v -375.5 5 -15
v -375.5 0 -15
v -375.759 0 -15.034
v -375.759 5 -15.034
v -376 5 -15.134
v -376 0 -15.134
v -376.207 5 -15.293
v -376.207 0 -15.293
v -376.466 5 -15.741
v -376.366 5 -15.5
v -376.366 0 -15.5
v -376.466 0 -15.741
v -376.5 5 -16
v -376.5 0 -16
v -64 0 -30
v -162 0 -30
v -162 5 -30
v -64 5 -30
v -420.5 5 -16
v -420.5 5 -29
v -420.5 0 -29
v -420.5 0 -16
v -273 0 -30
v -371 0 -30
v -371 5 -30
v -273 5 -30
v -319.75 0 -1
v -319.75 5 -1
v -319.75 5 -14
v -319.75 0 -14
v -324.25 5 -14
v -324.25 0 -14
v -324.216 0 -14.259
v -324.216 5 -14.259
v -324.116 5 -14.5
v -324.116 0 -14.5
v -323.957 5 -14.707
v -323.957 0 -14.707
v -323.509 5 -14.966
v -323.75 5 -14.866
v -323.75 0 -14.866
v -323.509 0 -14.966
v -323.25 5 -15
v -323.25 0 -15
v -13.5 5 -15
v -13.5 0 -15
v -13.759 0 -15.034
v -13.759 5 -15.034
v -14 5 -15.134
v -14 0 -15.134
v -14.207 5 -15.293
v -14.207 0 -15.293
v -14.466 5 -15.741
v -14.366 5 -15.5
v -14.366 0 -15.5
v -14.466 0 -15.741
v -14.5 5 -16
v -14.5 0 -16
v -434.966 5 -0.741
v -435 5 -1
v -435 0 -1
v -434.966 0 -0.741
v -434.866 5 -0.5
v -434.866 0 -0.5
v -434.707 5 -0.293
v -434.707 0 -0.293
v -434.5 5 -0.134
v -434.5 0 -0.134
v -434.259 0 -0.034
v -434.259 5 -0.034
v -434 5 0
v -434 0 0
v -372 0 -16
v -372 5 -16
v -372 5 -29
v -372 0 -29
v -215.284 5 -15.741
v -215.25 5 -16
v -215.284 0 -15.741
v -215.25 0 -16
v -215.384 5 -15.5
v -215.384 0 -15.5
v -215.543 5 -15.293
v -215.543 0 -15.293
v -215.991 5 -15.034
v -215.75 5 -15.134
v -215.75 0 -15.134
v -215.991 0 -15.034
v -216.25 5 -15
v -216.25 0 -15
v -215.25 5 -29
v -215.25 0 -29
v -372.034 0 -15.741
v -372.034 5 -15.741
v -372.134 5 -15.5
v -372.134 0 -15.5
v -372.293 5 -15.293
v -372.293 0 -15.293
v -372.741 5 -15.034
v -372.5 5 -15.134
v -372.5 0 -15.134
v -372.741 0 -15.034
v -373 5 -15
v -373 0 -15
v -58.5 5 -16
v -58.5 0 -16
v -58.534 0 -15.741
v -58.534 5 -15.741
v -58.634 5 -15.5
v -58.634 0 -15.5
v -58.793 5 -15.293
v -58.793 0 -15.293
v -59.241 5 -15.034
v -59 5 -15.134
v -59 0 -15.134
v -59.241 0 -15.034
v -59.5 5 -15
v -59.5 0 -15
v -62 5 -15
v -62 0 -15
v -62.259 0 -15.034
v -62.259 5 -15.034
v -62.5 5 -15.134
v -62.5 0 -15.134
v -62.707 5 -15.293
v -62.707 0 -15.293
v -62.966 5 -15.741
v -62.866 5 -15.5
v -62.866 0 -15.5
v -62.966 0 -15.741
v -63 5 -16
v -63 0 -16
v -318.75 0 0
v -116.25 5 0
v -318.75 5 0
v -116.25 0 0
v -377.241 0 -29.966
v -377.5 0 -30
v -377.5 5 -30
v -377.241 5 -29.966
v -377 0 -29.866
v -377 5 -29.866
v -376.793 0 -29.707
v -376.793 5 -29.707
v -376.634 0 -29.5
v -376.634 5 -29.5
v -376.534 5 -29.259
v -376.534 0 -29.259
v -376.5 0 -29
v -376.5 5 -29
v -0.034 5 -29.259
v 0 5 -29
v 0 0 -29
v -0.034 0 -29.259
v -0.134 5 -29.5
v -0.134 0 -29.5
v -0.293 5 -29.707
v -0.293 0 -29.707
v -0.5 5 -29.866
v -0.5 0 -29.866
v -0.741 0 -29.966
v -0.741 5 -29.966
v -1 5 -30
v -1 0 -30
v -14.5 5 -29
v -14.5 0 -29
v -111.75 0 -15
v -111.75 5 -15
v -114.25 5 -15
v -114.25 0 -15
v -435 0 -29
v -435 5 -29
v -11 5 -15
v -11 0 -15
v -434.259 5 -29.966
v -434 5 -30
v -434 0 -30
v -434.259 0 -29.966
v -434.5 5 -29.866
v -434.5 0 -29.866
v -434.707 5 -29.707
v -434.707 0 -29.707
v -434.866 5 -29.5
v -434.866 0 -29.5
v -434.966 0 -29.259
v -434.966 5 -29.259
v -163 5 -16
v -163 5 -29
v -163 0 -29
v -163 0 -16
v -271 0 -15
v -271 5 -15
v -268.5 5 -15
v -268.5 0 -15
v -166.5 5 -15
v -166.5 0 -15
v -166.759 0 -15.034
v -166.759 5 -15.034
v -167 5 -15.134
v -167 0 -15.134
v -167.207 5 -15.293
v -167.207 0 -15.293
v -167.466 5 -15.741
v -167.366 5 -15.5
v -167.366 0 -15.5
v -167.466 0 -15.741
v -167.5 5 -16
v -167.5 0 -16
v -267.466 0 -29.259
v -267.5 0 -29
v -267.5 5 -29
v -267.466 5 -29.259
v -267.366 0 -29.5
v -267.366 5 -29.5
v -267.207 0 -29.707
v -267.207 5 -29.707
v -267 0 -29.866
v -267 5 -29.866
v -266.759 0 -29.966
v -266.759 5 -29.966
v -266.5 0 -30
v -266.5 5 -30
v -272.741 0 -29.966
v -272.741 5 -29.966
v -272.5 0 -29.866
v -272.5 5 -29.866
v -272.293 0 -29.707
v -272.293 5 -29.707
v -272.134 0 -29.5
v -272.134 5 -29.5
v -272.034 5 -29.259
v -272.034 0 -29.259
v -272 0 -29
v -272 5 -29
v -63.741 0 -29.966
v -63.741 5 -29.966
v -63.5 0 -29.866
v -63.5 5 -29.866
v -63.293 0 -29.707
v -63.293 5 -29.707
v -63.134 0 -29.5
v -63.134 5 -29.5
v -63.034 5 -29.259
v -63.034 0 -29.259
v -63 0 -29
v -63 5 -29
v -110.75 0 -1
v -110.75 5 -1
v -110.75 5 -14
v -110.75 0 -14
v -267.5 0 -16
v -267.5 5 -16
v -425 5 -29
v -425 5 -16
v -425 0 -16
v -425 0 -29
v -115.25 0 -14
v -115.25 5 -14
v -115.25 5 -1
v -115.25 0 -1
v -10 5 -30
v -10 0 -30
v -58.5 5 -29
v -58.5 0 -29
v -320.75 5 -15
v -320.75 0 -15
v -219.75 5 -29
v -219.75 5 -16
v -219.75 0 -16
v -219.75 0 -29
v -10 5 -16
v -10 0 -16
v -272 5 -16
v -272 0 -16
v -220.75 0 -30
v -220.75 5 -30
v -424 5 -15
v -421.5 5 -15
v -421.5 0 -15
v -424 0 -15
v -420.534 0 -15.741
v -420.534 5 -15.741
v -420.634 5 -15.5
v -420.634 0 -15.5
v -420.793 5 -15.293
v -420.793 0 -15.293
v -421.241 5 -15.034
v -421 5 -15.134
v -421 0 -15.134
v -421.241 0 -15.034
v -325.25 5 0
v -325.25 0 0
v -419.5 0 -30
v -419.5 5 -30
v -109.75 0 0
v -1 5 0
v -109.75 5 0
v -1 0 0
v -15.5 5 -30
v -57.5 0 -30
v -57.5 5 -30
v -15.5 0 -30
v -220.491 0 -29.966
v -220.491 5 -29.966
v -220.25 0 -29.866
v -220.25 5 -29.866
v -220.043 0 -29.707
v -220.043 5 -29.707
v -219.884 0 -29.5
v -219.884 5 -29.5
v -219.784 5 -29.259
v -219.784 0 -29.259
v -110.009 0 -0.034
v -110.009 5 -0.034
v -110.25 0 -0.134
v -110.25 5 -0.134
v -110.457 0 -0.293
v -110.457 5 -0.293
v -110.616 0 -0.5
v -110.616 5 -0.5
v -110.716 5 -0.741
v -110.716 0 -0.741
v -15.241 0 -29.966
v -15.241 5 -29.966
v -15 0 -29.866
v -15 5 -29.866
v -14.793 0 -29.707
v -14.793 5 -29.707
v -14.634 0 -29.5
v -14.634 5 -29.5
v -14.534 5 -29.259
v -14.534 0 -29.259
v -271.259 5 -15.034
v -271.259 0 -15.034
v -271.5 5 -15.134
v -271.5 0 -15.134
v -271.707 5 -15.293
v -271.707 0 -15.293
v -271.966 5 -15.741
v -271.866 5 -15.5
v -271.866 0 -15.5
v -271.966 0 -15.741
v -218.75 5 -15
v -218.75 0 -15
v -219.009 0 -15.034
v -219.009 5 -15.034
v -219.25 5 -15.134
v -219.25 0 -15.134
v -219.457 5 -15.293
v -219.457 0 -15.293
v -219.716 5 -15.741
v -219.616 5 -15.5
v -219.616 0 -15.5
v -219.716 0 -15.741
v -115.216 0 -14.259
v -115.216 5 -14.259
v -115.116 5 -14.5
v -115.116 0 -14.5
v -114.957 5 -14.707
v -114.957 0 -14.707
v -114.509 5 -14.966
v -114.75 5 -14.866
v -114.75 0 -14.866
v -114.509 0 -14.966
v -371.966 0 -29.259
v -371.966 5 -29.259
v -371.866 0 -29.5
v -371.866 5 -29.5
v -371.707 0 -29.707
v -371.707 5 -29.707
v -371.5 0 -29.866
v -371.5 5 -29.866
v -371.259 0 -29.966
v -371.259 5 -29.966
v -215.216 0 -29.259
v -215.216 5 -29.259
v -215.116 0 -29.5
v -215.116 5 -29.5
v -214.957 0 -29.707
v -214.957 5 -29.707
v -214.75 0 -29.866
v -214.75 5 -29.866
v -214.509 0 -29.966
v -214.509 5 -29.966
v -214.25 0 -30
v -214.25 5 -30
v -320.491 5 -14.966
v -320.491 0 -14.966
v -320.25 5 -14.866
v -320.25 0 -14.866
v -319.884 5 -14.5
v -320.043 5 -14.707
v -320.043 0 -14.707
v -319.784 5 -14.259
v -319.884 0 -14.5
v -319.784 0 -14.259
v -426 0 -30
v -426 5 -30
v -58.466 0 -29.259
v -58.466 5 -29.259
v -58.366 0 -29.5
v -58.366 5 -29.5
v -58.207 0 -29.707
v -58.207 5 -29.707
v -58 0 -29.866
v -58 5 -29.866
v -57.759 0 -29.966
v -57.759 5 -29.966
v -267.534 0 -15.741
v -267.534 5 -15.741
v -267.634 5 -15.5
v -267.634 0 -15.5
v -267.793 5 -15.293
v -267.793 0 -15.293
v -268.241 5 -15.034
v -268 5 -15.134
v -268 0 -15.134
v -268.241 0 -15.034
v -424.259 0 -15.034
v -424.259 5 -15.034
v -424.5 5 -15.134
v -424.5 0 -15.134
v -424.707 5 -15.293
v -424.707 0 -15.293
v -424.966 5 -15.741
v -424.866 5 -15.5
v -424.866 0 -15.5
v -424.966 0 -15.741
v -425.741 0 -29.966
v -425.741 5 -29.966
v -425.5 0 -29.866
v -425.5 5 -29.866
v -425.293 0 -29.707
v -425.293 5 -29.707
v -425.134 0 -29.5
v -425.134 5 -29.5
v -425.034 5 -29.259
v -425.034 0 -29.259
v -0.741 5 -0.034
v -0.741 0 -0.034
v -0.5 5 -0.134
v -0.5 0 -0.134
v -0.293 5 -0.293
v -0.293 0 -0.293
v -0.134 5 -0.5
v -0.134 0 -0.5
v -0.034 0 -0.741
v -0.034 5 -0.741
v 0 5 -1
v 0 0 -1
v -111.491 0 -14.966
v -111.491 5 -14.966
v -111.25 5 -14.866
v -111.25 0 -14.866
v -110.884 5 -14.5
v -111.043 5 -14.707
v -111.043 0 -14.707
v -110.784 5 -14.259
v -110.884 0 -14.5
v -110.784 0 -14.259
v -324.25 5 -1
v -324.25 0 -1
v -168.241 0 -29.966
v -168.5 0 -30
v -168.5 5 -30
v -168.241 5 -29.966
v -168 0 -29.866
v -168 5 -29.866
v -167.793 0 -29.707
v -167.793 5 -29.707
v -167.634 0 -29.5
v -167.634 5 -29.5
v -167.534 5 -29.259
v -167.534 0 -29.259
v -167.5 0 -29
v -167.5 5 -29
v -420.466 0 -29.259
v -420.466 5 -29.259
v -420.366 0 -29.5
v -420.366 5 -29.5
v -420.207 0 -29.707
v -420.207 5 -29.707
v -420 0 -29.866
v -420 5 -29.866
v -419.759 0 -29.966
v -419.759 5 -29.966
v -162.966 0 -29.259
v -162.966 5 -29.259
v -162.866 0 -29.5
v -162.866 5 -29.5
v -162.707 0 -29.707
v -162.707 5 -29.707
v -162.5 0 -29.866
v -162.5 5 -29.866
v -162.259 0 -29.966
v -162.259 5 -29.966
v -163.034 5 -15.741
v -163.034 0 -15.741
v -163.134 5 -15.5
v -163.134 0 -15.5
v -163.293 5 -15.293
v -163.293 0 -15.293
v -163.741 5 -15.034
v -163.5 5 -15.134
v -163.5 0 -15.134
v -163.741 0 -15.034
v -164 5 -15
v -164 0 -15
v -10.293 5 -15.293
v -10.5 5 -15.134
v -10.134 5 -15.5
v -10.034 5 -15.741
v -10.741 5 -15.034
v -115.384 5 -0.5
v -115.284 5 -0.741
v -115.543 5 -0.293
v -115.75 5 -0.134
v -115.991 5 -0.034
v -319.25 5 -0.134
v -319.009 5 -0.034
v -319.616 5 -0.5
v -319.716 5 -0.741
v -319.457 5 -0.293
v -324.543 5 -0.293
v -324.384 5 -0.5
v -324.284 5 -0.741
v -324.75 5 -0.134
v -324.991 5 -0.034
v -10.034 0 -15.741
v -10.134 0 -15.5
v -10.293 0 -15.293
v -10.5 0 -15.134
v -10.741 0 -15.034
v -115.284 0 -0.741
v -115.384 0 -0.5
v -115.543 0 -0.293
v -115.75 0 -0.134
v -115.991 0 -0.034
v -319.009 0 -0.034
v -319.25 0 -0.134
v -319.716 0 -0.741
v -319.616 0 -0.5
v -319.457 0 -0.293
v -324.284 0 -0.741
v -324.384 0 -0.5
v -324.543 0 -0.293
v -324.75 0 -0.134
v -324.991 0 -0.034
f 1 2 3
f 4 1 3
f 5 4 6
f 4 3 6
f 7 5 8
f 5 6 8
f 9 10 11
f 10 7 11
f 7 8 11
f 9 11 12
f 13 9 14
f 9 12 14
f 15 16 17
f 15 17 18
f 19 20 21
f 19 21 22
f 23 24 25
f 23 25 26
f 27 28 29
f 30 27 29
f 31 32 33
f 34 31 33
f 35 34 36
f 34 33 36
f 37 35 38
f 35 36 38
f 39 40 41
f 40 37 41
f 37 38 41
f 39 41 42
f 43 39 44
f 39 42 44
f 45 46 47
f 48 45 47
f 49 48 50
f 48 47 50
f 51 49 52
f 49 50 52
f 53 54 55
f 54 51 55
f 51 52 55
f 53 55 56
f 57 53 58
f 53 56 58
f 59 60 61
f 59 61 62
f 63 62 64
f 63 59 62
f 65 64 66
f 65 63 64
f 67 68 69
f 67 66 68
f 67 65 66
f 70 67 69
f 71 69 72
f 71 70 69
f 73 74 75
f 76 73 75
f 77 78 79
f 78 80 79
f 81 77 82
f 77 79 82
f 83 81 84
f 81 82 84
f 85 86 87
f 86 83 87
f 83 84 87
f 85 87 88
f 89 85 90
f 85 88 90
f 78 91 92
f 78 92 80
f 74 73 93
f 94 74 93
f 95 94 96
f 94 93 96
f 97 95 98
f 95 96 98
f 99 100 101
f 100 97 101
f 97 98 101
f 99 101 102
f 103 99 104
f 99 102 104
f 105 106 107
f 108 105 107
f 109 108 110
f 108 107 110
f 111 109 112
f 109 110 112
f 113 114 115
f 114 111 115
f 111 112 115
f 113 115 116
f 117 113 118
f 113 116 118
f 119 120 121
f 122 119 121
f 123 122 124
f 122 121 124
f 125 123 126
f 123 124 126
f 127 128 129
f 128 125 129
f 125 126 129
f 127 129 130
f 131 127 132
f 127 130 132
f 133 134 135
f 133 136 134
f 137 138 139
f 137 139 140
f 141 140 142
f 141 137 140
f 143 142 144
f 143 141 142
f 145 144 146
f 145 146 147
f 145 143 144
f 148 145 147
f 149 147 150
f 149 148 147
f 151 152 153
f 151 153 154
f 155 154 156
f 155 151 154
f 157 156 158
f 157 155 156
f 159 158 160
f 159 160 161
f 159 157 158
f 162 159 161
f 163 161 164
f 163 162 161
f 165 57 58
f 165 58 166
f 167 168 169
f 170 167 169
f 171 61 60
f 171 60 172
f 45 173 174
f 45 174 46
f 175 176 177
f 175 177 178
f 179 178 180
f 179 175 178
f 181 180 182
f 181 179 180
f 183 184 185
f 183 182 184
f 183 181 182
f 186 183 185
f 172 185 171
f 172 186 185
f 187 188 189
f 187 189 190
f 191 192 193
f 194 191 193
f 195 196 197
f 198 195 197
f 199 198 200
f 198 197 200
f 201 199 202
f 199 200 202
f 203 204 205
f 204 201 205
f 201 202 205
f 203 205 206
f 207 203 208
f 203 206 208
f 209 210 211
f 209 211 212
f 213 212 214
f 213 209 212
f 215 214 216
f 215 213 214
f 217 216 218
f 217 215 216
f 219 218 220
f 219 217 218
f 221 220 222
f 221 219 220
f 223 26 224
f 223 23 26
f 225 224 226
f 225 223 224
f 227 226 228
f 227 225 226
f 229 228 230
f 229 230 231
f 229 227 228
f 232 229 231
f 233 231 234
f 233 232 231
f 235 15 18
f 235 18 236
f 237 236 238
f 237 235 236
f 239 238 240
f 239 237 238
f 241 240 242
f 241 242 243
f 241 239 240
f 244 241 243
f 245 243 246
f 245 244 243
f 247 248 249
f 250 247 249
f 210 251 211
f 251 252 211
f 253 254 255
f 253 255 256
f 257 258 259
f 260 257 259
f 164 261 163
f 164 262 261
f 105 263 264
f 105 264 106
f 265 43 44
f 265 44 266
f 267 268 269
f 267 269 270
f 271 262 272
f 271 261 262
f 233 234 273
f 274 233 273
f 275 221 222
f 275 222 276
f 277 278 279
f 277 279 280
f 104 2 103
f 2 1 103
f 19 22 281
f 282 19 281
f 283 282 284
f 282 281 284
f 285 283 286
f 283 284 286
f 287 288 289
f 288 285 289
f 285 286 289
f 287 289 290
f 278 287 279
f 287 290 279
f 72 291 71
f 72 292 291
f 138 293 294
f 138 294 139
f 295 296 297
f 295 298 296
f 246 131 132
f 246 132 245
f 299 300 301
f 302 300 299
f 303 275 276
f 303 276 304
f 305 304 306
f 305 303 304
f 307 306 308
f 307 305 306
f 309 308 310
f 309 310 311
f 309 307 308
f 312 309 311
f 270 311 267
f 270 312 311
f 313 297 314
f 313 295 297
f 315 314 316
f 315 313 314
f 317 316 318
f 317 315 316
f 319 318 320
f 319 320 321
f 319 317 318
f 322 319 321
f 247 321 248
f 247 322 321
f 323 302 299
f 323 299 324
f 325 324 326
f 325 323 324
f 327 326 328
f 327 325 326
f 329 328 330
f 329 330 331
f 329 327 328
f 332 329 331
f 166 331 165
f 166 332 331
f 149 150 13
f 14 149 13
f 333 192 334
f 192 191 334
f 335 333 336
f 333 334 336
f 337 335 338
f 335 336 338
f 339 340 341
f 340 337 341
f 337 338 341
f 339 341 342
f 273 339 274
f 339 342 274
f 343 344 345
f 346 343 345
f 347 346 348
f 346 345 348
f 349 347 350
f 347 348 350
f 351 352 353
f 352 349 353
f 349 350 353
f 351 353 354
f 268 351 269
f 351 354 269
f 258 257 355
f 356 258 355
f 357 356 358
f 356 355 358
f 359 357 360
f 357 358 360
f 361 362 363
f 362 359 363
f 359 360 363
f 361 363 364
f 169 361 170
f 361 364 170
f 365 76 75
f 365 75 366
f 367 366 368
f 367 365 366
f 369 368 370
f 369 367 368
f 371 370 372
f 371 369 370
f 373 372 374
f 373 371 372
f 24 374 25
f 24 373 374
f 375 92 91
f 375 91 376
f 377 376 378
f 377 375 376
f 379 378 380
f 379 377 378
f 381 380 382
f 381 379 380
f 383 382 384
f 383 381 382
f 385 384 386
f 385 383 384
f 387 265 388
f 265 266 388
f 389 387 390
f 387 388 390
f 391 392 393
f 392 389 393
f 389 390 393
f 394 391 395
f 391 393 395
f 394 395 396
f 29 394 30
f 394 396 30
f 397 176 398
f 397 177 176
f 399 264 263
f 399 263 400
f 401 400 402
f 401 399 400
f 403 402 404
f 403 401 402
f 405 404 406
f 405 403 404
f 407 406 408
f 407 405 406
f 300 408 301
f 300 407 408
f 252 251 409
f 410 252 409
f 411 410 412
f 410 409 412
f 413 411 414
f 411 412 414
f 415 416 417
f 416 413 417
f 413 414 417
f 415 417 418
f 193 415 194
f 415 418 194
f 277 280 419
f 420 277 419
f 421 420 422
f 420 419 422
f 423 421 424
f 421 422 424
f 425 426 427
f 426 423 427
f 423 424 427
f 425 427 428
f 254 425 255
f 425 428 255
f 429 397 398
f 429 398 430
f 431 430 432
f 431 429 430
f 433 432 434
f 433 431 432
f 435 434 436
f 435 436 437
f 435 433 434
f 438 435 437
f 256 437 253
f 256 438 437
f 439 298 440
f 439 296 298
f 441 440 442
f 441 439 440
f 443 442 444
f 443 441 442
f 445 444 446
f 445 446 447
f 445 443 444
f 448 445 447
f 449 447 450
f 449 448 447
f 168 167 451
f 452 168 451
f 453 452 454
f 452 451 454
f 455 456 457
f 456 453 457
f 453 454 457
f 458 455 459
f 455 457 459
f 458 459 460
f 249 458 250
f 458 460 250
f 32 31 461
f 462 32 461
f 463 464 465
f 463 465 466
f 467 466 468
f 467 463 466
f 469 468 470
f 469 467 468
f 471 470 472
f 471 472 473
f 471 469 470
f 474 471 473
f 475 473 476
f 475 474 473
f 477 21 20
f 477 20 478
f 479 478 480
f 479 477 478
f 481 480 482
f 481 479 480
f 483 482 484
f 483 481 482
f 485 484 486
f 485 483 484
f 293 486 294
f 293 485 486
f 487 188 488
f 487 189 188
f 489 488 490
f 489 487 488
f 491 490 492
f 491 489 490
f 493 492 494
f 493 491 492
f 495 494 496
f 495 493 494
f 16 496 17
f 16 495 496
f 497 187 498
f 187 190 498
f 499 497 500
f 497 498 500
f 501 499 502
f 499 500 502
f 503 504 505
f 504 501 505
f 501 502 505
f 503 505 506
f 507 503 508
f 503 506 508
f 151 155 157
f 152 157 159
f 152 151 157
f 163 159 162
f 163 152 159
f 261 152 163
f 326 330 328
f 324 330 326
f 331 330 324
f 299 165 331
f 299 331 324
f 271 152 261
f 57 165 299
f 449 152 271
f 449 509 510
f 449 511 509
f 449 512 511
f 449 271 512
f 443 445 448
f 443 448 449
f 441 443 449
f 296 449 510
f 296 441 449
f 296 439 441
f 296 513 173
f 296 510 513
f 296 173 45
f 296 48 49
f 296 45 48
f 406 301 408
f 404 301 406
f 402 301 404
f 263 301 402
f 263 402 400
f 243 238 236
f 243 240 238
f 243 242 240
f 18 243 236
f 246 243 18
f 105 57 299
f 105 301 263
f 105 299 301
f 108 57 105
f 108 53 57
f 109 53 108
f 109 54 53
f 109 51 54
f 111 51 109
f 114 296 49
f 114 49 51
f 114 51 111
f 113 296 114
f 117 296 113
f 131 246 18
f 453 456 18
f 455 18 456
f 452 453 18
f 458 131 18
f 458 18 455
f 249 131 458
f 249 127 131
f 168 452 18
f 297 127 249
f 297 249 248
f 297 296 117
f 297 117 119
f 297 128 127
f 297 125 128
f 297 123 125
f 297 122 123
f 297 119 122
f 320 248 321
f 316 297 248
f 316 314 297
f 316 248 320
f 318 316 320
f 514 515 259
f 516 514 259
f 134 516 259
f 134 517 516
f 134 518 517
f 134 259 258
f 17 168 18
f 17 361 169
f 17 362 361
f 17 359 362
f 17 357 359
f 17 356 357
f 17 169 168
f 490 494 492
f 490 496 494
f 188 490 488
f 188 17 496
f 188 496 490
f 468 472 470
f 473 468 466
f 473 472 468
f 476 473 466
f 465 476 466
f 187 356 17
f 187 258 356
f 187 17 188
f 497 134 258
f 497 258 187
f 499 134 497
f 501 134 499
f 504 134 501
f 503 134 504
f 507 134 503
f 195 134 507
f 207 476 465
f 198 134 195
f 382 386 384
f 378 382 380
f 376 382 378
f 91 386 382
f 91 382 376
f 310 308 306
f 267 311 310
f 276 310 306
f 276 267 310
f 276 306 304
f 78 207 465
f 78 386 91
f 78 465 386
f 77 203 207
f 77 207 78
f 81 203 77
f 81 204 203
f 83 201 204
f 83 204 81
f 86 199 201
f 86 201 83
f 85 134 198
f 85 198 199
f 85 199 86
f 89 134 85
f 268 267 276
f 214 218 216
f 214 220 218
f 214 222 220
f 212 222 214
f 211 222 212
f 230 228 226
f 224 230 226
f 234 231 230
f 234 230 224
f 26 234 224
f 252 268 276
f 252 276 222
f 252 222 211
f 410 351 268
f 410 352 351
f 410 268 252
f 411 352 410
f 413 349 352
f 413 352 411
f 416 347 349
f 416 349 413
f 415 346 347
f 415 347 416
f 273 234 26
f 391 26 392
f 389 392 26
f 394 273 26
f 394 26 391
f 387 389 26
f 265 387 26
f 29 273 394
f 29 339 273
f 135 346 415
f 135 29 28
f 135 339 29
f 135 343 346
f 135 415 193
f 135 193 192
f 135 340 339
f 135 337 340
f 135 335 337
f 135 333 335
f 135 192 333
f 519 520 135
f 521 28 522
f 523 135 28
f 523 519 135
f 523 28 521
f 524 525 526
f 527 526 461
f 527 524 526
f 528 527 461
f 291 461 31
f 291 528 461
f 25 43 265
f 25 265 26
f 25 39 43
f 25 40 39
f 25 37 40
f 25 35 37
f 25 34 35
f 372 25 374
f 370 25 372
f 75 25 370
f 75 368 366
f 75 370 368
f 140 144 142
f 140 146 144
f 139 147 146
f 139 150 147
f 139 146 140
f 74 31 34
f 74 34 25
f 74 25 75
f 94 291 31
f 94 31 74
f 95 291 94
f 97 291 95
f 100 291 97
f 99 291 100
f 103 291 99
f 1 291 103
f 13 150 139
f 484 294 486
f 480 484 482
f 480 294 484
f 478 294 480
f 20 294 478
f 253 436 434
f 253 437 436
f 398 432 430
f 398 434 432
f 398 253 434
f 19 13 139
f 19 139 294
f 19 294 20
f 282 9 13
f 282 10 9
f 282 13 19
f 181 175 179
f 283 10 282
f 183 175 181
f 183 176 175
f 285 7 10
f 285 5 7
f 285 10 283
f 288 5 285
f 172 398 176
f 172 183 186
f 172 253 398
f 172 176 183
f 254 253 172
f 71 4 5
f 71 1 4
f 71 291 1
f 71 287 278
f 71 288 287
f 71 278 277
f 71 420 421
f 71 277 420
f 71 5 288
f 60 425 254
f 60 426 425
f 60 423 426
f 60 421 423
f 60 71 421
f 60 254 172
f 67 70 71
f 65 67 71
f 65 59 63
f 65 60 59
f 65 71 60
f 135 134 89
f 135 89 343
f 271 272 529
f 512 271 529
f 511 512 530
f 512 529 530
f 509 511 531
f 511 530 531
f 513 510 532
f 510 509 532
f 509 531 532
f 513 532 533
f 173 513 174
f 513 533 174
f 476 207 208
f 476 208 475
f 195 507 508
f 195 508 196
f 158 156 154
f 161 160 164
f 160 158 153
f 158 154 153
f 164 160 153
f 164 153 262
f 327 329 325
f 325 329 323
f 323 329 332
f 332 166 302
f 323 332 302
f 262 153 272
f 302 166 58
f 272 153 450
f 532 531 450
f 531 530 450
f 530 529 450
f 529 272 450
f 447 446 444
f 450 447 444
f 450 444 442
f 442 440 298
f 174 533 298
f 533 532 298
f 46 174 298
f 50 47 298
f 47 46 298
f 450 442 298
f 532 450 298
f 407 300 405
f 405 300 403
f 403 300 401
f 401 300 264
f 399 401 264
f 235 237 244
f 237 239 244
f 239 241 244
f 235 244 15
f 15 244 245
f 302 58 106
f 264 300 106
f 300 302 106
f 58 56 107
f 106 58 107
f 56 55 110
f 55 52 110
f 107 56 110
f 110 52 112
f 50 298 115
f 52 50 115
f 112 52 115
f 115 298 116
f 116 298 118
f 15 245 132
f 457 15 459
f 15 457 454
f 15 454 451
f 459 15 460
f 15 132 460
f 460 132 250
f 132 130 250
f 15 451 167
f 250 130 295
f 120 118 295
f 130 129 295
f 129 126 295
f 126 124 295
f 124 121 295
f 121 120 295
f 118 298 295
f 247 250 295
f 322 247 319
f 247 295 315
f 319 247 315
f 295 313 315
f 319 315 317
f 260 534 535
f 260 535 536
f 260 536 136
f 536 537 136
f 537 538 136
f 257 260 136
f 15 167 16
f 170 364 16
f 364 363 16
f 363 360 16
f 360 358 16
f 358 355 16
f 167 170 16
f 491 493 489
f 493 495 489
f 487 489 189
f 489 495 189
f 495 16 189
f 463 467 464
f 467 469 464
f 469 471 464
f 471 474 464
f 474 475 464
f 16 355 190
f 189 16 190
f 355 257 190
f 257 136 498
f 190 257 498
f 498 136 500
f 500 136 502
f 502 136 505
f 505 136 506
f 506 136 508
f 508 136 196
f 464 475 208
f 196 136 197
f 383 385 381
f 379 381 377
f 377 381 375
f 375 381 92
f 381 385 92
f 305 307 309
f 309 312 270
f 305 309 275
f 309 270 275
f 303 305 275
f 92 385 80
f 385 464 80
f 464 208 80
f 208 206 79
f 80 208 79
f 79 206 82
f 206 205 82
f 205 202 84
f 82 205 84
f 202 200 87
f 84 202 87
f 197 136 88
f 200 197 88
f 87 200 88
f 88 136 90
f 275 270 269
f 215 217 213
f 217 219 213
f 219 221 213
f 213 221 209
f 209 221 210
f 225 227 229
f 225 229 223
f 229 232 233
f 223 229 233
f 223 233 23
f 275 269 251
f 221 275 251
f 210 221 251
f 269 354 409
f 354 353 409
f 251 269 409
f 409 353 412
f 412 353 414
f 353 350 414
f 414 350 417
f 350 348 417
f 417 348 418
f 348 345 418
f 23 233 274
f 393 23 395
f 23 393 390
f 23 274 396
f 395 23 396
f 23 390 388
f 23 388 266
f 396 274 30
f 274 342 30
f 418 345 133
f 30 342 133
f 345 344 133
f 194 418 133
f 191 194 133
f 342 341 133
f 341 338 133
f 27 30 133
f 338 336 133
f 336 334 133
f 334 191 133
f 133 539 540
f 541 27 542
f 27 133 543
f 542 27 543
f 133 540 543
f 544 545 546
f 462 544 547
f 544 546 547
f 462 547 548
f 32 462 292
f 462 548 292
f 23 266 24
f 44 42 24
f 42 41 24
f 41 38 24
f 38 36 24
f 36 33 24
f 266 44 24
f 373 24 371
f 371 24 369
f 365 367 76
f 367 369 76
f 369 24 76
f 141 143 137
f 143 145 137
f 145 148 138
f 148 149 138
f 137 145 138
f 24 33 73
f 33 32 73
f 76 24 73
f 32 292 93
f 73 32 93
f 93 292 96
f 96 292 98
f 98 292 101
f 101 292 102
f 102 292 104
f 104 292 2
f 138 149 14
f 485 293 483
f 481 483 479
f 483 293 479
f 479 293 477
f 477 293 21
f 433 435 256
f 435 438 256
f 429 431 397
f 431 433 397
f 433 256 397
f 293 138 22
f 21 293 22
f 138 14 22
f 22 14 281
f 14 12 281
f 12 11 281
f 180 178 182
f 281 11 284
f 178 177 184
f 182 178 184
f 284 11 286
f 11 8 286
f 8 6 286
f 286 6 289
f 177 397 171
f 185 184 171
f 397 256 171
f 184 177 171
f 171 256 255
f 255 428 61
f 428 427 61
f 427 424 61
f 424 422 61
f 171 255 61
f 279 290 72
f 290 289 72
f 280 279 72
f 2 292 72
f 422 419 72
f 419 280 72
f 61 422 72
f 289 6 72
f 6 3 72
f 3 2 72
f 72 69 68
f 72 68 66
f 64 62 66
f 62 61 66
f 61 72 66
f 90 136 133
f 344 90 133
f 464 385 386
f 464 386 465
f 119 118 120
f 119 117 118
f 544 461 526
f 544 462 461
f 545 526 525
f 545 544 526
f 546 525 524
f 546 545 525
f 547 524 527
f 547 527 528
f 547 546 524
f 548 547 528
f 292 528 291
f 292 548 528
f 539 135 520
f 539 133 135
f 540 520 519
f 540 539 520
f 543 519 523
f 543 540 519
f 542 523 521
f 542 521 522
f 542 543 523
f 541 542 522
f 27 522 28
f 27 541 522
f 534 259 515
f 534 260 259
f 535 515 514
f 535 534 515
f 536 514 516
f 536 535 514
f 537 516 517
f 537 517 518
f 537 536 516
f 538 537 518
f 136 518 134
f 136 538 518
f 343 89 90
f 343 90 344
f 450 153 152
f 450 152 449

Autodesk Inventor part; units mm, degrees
ref_plane "YZ Plane" through (0, 0, 0) normal (1, 0, 0) x (0, 1, 0)
ref_plane "XZ Plane" through (0, 0, 0) normal (0, 1, 0) x (-1, 0, 0)
ref_plane "XY Plane" through (0, 0, 0) normal (0, 0, 1) x (1, 0, 0)
sketch "Sketch1" plane through (0, 0, 0) normal (0, 1, 0) x (-1, 0, 0)
  line L0 (0, 0) -> (435, 0)
  line L1 (435, 0) -> (435, -30)
  line L2 (435, -30) -> (0, -30)
  line L3 (0, -30) -> (0, 0)
  dimension "d0" = 435
  dimension "d1" = 30
extrude "Extrusion1" add sketch "Sketch1" along normal blind 5
sketch "Sketch2" plane through (0, 5, 0) normal (0, 1, 0) x (1, 0, 0)
  line L0 (0, 30) -> (-435, 30) projected
  line L1 (-435, 30) -> (-425, 30)
  line L2 (-425, 30) -> (-420.5, 30)
  line L3 (-420.5, 30) -> (-420.5, 15)
  line L4 (-420.5, 15) -> (-425, 15)
  line L5 (-425, 15) -> (-425, 30)
  line L6 (-420.5, 30) -> (-219.75, 30)
  line L7 (-219.75, 30) -> (-215.25, 30)
  line L8 (-215.25, 30) -> (-215.25, 15)
  line L9 (-215.25, 15) -> (-219.75, 15)
  line L10 (-219.75, 15) -> (-219.75, 30)
  line L11 (-215.25, 30) -> (-14.5, 30)
  line L12 (-14.5, 30) -> (-10, 30)
  line L13 (-10, 30) -> (-10, 15)
  line L14 (-10, 15) -> (-14.5, 15)
  line L15 (-14.5, 15) -> (-14.5, 30)
  point P0 (0, 0)
  dimension "d4" = 10
  dimension "d5" = 4.5
  dimension "d6" = 15
  dimension "d7" = 200.75
  dimension "d8" = 4.5
  dimension "d9" = 15
  dimension "d10" = 200.75
  dimension "d11" = 4.5
  dimension "d12" = 15
extrude "Extrusion2" cut sketch "Sketch2" against normal blind 5
sketch "Sketch6" plane through (0, 5, 0) normal (0, 1, 0) x (1, 0, 0)
  line L0 (-14.5, 30) -> (-14.5, 15) projected
  line L1 (-14.5, 15) -> (-58.5, 15)
  line L2 (-14.5, 30) -> (-215.25, 30) projected
  line L3 (-58.5, 15) -> (-63, 15)
  line L4 (-63, 15) -> (-63, 30)
  line L5 (-63, 30) -> (-58.5, 30)
  line L6 (-58.5, 30) -> (-58.5, 15)
  line L7 (-63, 15) -> (-110.75, 15)
  line L8 (-110.75, 15) -> (-115.25, 15)
  line L9 (-115.25, 15) -> (-115.25, 30)
  line L10 (-115.25, 30) -> (-110.75, 30)
  line L11 (-110.75, 30) -> (-110.75, 15)
  line L12 (-115.25, 15) -> (-163, 15)
  line L13 (-163, 15) -> (-167.5, 15)
  line L14 (-167.5, 15) -> (-167.5, 30)
  line L15 (-167.5, 30) -> (-163, 30)
  line L16 (-163, 30) -> (-163, 15)
  line L17 (-435, 0) -> (0, 0) projected
  line L18 (-217.5, 0) -> (-217.5, 47.2454)
  line L19 (-376.5, 15) -> (-372, 15)
  line L20 (-372, 15) -> (-372, 30)
  line L21 (-372, 30) -> (-376.5, 30)
  line L22 (-376.5, 30) -> (-376.5, 15)
  line L23 (-372, 15) -> (-324.25, 15)
  line L24 (-324.25, 15) -> (-319.75, 15)
  line L25 (-319.75, 15) -> (-319.75, 30)
  line L26 (-319.75, 30) -> (-324.25, 30)
  line L27 (-324.25, 30) -> (-324.25, 15)
  line L28 (-319.75, 15) -> (-272, 15)
  line L29 (-272, 15) -> (-267.5, 15)
  line L30 (-267.5, 15) -> (-267.5, 30)
  line L31 (-267.5, 30) -> (-272, 30)
  line L32 (-272, 30) -> (-272, 15)
  line L33 (-110.75, 15) -> (-115.25, 15)
  line L34 (-115.25, 15) -> (-115.25, 0)
  line L35 (-115.25, 0) -> (-110.75, 0)
  line L36 (-110.75, 0) -> (-110.75, 15)
  line L37 (-319.75, 15) -> (-324.25, 15)
  line L38 (-324.25, 15) -> (-324.25, 0)
  line L39 (-324.25, 0) -> (-319.75, 0)
  line L40 (-319.75, 0) -> (-319.75, 15)
  dimension "d40" = 44
  dimension "d41" = 4.5
  dimension "d42" = 47.75
  dimension "d43" = 4.5
  dimension "d44" = 47.75
  dimension "d45" = 4.5
  dimension "d48" = 15
  dimension "d49" = 4.5
  dimension "d50" = 106.75
extrude "Extrusion6" cut sketch "Sketch6" against normal blind 5 contours L19 L22 L21 L20 | L32 L31 L30 L29 | L17 L38 L24 L40 | L6 L3 L4 L2 | L36 L17 L34 L8 | L16 L13 L14 L2
fillet "Fillet2" radius 1 39 edges at (0, 2.5, -30) (-10, 2.5, -15) (-14.5, 2.5, -15) (-14.5, 2.5, -30) (0, 2.5, 0) (-110.75, 2.5, 0) (-115.25, 2.5, 0) (-115.25, 2.5, -15) (-110.75, 2.5, -15) (-63, 2.5, -15) (-58.5, 2.5, -15) (-58.5, 2.5, -30) (-63, 2.5, -30) (-163, 2.5, -15) (-167.5, 2.5, -15) (-163, 2.5, -30) (-167.5, 2.5, -30) (-219.75, 2.5, -30) (-215.25, 2.5, -30) (-215.25, 2.5, -15) (-219.75, 2.5, -15) (-267.5, 2.5, -15) (-272, 2.5, -15) (-272, 2.5, -30) (-267.5, 2.5, -30) (-319.75, 2.5, 0) (-324.25, 2.5, 0) (-324.25, 2.5, -15) (-319.75, 2.5, -15) (-376.5, 2.5, -30) (-376.5, 2.5, -15) (-372, 2.5, -15) (-372, 2.5, -30) (-420.5, 2.5, -30) (-425, 2.5, -30) (-420.5, 2.5, -15) (-425, 2.5, -15) (-435, 2.5, 0) (-435, 2.5, -30)
properties part number "slats" material "Foam Core Board"
